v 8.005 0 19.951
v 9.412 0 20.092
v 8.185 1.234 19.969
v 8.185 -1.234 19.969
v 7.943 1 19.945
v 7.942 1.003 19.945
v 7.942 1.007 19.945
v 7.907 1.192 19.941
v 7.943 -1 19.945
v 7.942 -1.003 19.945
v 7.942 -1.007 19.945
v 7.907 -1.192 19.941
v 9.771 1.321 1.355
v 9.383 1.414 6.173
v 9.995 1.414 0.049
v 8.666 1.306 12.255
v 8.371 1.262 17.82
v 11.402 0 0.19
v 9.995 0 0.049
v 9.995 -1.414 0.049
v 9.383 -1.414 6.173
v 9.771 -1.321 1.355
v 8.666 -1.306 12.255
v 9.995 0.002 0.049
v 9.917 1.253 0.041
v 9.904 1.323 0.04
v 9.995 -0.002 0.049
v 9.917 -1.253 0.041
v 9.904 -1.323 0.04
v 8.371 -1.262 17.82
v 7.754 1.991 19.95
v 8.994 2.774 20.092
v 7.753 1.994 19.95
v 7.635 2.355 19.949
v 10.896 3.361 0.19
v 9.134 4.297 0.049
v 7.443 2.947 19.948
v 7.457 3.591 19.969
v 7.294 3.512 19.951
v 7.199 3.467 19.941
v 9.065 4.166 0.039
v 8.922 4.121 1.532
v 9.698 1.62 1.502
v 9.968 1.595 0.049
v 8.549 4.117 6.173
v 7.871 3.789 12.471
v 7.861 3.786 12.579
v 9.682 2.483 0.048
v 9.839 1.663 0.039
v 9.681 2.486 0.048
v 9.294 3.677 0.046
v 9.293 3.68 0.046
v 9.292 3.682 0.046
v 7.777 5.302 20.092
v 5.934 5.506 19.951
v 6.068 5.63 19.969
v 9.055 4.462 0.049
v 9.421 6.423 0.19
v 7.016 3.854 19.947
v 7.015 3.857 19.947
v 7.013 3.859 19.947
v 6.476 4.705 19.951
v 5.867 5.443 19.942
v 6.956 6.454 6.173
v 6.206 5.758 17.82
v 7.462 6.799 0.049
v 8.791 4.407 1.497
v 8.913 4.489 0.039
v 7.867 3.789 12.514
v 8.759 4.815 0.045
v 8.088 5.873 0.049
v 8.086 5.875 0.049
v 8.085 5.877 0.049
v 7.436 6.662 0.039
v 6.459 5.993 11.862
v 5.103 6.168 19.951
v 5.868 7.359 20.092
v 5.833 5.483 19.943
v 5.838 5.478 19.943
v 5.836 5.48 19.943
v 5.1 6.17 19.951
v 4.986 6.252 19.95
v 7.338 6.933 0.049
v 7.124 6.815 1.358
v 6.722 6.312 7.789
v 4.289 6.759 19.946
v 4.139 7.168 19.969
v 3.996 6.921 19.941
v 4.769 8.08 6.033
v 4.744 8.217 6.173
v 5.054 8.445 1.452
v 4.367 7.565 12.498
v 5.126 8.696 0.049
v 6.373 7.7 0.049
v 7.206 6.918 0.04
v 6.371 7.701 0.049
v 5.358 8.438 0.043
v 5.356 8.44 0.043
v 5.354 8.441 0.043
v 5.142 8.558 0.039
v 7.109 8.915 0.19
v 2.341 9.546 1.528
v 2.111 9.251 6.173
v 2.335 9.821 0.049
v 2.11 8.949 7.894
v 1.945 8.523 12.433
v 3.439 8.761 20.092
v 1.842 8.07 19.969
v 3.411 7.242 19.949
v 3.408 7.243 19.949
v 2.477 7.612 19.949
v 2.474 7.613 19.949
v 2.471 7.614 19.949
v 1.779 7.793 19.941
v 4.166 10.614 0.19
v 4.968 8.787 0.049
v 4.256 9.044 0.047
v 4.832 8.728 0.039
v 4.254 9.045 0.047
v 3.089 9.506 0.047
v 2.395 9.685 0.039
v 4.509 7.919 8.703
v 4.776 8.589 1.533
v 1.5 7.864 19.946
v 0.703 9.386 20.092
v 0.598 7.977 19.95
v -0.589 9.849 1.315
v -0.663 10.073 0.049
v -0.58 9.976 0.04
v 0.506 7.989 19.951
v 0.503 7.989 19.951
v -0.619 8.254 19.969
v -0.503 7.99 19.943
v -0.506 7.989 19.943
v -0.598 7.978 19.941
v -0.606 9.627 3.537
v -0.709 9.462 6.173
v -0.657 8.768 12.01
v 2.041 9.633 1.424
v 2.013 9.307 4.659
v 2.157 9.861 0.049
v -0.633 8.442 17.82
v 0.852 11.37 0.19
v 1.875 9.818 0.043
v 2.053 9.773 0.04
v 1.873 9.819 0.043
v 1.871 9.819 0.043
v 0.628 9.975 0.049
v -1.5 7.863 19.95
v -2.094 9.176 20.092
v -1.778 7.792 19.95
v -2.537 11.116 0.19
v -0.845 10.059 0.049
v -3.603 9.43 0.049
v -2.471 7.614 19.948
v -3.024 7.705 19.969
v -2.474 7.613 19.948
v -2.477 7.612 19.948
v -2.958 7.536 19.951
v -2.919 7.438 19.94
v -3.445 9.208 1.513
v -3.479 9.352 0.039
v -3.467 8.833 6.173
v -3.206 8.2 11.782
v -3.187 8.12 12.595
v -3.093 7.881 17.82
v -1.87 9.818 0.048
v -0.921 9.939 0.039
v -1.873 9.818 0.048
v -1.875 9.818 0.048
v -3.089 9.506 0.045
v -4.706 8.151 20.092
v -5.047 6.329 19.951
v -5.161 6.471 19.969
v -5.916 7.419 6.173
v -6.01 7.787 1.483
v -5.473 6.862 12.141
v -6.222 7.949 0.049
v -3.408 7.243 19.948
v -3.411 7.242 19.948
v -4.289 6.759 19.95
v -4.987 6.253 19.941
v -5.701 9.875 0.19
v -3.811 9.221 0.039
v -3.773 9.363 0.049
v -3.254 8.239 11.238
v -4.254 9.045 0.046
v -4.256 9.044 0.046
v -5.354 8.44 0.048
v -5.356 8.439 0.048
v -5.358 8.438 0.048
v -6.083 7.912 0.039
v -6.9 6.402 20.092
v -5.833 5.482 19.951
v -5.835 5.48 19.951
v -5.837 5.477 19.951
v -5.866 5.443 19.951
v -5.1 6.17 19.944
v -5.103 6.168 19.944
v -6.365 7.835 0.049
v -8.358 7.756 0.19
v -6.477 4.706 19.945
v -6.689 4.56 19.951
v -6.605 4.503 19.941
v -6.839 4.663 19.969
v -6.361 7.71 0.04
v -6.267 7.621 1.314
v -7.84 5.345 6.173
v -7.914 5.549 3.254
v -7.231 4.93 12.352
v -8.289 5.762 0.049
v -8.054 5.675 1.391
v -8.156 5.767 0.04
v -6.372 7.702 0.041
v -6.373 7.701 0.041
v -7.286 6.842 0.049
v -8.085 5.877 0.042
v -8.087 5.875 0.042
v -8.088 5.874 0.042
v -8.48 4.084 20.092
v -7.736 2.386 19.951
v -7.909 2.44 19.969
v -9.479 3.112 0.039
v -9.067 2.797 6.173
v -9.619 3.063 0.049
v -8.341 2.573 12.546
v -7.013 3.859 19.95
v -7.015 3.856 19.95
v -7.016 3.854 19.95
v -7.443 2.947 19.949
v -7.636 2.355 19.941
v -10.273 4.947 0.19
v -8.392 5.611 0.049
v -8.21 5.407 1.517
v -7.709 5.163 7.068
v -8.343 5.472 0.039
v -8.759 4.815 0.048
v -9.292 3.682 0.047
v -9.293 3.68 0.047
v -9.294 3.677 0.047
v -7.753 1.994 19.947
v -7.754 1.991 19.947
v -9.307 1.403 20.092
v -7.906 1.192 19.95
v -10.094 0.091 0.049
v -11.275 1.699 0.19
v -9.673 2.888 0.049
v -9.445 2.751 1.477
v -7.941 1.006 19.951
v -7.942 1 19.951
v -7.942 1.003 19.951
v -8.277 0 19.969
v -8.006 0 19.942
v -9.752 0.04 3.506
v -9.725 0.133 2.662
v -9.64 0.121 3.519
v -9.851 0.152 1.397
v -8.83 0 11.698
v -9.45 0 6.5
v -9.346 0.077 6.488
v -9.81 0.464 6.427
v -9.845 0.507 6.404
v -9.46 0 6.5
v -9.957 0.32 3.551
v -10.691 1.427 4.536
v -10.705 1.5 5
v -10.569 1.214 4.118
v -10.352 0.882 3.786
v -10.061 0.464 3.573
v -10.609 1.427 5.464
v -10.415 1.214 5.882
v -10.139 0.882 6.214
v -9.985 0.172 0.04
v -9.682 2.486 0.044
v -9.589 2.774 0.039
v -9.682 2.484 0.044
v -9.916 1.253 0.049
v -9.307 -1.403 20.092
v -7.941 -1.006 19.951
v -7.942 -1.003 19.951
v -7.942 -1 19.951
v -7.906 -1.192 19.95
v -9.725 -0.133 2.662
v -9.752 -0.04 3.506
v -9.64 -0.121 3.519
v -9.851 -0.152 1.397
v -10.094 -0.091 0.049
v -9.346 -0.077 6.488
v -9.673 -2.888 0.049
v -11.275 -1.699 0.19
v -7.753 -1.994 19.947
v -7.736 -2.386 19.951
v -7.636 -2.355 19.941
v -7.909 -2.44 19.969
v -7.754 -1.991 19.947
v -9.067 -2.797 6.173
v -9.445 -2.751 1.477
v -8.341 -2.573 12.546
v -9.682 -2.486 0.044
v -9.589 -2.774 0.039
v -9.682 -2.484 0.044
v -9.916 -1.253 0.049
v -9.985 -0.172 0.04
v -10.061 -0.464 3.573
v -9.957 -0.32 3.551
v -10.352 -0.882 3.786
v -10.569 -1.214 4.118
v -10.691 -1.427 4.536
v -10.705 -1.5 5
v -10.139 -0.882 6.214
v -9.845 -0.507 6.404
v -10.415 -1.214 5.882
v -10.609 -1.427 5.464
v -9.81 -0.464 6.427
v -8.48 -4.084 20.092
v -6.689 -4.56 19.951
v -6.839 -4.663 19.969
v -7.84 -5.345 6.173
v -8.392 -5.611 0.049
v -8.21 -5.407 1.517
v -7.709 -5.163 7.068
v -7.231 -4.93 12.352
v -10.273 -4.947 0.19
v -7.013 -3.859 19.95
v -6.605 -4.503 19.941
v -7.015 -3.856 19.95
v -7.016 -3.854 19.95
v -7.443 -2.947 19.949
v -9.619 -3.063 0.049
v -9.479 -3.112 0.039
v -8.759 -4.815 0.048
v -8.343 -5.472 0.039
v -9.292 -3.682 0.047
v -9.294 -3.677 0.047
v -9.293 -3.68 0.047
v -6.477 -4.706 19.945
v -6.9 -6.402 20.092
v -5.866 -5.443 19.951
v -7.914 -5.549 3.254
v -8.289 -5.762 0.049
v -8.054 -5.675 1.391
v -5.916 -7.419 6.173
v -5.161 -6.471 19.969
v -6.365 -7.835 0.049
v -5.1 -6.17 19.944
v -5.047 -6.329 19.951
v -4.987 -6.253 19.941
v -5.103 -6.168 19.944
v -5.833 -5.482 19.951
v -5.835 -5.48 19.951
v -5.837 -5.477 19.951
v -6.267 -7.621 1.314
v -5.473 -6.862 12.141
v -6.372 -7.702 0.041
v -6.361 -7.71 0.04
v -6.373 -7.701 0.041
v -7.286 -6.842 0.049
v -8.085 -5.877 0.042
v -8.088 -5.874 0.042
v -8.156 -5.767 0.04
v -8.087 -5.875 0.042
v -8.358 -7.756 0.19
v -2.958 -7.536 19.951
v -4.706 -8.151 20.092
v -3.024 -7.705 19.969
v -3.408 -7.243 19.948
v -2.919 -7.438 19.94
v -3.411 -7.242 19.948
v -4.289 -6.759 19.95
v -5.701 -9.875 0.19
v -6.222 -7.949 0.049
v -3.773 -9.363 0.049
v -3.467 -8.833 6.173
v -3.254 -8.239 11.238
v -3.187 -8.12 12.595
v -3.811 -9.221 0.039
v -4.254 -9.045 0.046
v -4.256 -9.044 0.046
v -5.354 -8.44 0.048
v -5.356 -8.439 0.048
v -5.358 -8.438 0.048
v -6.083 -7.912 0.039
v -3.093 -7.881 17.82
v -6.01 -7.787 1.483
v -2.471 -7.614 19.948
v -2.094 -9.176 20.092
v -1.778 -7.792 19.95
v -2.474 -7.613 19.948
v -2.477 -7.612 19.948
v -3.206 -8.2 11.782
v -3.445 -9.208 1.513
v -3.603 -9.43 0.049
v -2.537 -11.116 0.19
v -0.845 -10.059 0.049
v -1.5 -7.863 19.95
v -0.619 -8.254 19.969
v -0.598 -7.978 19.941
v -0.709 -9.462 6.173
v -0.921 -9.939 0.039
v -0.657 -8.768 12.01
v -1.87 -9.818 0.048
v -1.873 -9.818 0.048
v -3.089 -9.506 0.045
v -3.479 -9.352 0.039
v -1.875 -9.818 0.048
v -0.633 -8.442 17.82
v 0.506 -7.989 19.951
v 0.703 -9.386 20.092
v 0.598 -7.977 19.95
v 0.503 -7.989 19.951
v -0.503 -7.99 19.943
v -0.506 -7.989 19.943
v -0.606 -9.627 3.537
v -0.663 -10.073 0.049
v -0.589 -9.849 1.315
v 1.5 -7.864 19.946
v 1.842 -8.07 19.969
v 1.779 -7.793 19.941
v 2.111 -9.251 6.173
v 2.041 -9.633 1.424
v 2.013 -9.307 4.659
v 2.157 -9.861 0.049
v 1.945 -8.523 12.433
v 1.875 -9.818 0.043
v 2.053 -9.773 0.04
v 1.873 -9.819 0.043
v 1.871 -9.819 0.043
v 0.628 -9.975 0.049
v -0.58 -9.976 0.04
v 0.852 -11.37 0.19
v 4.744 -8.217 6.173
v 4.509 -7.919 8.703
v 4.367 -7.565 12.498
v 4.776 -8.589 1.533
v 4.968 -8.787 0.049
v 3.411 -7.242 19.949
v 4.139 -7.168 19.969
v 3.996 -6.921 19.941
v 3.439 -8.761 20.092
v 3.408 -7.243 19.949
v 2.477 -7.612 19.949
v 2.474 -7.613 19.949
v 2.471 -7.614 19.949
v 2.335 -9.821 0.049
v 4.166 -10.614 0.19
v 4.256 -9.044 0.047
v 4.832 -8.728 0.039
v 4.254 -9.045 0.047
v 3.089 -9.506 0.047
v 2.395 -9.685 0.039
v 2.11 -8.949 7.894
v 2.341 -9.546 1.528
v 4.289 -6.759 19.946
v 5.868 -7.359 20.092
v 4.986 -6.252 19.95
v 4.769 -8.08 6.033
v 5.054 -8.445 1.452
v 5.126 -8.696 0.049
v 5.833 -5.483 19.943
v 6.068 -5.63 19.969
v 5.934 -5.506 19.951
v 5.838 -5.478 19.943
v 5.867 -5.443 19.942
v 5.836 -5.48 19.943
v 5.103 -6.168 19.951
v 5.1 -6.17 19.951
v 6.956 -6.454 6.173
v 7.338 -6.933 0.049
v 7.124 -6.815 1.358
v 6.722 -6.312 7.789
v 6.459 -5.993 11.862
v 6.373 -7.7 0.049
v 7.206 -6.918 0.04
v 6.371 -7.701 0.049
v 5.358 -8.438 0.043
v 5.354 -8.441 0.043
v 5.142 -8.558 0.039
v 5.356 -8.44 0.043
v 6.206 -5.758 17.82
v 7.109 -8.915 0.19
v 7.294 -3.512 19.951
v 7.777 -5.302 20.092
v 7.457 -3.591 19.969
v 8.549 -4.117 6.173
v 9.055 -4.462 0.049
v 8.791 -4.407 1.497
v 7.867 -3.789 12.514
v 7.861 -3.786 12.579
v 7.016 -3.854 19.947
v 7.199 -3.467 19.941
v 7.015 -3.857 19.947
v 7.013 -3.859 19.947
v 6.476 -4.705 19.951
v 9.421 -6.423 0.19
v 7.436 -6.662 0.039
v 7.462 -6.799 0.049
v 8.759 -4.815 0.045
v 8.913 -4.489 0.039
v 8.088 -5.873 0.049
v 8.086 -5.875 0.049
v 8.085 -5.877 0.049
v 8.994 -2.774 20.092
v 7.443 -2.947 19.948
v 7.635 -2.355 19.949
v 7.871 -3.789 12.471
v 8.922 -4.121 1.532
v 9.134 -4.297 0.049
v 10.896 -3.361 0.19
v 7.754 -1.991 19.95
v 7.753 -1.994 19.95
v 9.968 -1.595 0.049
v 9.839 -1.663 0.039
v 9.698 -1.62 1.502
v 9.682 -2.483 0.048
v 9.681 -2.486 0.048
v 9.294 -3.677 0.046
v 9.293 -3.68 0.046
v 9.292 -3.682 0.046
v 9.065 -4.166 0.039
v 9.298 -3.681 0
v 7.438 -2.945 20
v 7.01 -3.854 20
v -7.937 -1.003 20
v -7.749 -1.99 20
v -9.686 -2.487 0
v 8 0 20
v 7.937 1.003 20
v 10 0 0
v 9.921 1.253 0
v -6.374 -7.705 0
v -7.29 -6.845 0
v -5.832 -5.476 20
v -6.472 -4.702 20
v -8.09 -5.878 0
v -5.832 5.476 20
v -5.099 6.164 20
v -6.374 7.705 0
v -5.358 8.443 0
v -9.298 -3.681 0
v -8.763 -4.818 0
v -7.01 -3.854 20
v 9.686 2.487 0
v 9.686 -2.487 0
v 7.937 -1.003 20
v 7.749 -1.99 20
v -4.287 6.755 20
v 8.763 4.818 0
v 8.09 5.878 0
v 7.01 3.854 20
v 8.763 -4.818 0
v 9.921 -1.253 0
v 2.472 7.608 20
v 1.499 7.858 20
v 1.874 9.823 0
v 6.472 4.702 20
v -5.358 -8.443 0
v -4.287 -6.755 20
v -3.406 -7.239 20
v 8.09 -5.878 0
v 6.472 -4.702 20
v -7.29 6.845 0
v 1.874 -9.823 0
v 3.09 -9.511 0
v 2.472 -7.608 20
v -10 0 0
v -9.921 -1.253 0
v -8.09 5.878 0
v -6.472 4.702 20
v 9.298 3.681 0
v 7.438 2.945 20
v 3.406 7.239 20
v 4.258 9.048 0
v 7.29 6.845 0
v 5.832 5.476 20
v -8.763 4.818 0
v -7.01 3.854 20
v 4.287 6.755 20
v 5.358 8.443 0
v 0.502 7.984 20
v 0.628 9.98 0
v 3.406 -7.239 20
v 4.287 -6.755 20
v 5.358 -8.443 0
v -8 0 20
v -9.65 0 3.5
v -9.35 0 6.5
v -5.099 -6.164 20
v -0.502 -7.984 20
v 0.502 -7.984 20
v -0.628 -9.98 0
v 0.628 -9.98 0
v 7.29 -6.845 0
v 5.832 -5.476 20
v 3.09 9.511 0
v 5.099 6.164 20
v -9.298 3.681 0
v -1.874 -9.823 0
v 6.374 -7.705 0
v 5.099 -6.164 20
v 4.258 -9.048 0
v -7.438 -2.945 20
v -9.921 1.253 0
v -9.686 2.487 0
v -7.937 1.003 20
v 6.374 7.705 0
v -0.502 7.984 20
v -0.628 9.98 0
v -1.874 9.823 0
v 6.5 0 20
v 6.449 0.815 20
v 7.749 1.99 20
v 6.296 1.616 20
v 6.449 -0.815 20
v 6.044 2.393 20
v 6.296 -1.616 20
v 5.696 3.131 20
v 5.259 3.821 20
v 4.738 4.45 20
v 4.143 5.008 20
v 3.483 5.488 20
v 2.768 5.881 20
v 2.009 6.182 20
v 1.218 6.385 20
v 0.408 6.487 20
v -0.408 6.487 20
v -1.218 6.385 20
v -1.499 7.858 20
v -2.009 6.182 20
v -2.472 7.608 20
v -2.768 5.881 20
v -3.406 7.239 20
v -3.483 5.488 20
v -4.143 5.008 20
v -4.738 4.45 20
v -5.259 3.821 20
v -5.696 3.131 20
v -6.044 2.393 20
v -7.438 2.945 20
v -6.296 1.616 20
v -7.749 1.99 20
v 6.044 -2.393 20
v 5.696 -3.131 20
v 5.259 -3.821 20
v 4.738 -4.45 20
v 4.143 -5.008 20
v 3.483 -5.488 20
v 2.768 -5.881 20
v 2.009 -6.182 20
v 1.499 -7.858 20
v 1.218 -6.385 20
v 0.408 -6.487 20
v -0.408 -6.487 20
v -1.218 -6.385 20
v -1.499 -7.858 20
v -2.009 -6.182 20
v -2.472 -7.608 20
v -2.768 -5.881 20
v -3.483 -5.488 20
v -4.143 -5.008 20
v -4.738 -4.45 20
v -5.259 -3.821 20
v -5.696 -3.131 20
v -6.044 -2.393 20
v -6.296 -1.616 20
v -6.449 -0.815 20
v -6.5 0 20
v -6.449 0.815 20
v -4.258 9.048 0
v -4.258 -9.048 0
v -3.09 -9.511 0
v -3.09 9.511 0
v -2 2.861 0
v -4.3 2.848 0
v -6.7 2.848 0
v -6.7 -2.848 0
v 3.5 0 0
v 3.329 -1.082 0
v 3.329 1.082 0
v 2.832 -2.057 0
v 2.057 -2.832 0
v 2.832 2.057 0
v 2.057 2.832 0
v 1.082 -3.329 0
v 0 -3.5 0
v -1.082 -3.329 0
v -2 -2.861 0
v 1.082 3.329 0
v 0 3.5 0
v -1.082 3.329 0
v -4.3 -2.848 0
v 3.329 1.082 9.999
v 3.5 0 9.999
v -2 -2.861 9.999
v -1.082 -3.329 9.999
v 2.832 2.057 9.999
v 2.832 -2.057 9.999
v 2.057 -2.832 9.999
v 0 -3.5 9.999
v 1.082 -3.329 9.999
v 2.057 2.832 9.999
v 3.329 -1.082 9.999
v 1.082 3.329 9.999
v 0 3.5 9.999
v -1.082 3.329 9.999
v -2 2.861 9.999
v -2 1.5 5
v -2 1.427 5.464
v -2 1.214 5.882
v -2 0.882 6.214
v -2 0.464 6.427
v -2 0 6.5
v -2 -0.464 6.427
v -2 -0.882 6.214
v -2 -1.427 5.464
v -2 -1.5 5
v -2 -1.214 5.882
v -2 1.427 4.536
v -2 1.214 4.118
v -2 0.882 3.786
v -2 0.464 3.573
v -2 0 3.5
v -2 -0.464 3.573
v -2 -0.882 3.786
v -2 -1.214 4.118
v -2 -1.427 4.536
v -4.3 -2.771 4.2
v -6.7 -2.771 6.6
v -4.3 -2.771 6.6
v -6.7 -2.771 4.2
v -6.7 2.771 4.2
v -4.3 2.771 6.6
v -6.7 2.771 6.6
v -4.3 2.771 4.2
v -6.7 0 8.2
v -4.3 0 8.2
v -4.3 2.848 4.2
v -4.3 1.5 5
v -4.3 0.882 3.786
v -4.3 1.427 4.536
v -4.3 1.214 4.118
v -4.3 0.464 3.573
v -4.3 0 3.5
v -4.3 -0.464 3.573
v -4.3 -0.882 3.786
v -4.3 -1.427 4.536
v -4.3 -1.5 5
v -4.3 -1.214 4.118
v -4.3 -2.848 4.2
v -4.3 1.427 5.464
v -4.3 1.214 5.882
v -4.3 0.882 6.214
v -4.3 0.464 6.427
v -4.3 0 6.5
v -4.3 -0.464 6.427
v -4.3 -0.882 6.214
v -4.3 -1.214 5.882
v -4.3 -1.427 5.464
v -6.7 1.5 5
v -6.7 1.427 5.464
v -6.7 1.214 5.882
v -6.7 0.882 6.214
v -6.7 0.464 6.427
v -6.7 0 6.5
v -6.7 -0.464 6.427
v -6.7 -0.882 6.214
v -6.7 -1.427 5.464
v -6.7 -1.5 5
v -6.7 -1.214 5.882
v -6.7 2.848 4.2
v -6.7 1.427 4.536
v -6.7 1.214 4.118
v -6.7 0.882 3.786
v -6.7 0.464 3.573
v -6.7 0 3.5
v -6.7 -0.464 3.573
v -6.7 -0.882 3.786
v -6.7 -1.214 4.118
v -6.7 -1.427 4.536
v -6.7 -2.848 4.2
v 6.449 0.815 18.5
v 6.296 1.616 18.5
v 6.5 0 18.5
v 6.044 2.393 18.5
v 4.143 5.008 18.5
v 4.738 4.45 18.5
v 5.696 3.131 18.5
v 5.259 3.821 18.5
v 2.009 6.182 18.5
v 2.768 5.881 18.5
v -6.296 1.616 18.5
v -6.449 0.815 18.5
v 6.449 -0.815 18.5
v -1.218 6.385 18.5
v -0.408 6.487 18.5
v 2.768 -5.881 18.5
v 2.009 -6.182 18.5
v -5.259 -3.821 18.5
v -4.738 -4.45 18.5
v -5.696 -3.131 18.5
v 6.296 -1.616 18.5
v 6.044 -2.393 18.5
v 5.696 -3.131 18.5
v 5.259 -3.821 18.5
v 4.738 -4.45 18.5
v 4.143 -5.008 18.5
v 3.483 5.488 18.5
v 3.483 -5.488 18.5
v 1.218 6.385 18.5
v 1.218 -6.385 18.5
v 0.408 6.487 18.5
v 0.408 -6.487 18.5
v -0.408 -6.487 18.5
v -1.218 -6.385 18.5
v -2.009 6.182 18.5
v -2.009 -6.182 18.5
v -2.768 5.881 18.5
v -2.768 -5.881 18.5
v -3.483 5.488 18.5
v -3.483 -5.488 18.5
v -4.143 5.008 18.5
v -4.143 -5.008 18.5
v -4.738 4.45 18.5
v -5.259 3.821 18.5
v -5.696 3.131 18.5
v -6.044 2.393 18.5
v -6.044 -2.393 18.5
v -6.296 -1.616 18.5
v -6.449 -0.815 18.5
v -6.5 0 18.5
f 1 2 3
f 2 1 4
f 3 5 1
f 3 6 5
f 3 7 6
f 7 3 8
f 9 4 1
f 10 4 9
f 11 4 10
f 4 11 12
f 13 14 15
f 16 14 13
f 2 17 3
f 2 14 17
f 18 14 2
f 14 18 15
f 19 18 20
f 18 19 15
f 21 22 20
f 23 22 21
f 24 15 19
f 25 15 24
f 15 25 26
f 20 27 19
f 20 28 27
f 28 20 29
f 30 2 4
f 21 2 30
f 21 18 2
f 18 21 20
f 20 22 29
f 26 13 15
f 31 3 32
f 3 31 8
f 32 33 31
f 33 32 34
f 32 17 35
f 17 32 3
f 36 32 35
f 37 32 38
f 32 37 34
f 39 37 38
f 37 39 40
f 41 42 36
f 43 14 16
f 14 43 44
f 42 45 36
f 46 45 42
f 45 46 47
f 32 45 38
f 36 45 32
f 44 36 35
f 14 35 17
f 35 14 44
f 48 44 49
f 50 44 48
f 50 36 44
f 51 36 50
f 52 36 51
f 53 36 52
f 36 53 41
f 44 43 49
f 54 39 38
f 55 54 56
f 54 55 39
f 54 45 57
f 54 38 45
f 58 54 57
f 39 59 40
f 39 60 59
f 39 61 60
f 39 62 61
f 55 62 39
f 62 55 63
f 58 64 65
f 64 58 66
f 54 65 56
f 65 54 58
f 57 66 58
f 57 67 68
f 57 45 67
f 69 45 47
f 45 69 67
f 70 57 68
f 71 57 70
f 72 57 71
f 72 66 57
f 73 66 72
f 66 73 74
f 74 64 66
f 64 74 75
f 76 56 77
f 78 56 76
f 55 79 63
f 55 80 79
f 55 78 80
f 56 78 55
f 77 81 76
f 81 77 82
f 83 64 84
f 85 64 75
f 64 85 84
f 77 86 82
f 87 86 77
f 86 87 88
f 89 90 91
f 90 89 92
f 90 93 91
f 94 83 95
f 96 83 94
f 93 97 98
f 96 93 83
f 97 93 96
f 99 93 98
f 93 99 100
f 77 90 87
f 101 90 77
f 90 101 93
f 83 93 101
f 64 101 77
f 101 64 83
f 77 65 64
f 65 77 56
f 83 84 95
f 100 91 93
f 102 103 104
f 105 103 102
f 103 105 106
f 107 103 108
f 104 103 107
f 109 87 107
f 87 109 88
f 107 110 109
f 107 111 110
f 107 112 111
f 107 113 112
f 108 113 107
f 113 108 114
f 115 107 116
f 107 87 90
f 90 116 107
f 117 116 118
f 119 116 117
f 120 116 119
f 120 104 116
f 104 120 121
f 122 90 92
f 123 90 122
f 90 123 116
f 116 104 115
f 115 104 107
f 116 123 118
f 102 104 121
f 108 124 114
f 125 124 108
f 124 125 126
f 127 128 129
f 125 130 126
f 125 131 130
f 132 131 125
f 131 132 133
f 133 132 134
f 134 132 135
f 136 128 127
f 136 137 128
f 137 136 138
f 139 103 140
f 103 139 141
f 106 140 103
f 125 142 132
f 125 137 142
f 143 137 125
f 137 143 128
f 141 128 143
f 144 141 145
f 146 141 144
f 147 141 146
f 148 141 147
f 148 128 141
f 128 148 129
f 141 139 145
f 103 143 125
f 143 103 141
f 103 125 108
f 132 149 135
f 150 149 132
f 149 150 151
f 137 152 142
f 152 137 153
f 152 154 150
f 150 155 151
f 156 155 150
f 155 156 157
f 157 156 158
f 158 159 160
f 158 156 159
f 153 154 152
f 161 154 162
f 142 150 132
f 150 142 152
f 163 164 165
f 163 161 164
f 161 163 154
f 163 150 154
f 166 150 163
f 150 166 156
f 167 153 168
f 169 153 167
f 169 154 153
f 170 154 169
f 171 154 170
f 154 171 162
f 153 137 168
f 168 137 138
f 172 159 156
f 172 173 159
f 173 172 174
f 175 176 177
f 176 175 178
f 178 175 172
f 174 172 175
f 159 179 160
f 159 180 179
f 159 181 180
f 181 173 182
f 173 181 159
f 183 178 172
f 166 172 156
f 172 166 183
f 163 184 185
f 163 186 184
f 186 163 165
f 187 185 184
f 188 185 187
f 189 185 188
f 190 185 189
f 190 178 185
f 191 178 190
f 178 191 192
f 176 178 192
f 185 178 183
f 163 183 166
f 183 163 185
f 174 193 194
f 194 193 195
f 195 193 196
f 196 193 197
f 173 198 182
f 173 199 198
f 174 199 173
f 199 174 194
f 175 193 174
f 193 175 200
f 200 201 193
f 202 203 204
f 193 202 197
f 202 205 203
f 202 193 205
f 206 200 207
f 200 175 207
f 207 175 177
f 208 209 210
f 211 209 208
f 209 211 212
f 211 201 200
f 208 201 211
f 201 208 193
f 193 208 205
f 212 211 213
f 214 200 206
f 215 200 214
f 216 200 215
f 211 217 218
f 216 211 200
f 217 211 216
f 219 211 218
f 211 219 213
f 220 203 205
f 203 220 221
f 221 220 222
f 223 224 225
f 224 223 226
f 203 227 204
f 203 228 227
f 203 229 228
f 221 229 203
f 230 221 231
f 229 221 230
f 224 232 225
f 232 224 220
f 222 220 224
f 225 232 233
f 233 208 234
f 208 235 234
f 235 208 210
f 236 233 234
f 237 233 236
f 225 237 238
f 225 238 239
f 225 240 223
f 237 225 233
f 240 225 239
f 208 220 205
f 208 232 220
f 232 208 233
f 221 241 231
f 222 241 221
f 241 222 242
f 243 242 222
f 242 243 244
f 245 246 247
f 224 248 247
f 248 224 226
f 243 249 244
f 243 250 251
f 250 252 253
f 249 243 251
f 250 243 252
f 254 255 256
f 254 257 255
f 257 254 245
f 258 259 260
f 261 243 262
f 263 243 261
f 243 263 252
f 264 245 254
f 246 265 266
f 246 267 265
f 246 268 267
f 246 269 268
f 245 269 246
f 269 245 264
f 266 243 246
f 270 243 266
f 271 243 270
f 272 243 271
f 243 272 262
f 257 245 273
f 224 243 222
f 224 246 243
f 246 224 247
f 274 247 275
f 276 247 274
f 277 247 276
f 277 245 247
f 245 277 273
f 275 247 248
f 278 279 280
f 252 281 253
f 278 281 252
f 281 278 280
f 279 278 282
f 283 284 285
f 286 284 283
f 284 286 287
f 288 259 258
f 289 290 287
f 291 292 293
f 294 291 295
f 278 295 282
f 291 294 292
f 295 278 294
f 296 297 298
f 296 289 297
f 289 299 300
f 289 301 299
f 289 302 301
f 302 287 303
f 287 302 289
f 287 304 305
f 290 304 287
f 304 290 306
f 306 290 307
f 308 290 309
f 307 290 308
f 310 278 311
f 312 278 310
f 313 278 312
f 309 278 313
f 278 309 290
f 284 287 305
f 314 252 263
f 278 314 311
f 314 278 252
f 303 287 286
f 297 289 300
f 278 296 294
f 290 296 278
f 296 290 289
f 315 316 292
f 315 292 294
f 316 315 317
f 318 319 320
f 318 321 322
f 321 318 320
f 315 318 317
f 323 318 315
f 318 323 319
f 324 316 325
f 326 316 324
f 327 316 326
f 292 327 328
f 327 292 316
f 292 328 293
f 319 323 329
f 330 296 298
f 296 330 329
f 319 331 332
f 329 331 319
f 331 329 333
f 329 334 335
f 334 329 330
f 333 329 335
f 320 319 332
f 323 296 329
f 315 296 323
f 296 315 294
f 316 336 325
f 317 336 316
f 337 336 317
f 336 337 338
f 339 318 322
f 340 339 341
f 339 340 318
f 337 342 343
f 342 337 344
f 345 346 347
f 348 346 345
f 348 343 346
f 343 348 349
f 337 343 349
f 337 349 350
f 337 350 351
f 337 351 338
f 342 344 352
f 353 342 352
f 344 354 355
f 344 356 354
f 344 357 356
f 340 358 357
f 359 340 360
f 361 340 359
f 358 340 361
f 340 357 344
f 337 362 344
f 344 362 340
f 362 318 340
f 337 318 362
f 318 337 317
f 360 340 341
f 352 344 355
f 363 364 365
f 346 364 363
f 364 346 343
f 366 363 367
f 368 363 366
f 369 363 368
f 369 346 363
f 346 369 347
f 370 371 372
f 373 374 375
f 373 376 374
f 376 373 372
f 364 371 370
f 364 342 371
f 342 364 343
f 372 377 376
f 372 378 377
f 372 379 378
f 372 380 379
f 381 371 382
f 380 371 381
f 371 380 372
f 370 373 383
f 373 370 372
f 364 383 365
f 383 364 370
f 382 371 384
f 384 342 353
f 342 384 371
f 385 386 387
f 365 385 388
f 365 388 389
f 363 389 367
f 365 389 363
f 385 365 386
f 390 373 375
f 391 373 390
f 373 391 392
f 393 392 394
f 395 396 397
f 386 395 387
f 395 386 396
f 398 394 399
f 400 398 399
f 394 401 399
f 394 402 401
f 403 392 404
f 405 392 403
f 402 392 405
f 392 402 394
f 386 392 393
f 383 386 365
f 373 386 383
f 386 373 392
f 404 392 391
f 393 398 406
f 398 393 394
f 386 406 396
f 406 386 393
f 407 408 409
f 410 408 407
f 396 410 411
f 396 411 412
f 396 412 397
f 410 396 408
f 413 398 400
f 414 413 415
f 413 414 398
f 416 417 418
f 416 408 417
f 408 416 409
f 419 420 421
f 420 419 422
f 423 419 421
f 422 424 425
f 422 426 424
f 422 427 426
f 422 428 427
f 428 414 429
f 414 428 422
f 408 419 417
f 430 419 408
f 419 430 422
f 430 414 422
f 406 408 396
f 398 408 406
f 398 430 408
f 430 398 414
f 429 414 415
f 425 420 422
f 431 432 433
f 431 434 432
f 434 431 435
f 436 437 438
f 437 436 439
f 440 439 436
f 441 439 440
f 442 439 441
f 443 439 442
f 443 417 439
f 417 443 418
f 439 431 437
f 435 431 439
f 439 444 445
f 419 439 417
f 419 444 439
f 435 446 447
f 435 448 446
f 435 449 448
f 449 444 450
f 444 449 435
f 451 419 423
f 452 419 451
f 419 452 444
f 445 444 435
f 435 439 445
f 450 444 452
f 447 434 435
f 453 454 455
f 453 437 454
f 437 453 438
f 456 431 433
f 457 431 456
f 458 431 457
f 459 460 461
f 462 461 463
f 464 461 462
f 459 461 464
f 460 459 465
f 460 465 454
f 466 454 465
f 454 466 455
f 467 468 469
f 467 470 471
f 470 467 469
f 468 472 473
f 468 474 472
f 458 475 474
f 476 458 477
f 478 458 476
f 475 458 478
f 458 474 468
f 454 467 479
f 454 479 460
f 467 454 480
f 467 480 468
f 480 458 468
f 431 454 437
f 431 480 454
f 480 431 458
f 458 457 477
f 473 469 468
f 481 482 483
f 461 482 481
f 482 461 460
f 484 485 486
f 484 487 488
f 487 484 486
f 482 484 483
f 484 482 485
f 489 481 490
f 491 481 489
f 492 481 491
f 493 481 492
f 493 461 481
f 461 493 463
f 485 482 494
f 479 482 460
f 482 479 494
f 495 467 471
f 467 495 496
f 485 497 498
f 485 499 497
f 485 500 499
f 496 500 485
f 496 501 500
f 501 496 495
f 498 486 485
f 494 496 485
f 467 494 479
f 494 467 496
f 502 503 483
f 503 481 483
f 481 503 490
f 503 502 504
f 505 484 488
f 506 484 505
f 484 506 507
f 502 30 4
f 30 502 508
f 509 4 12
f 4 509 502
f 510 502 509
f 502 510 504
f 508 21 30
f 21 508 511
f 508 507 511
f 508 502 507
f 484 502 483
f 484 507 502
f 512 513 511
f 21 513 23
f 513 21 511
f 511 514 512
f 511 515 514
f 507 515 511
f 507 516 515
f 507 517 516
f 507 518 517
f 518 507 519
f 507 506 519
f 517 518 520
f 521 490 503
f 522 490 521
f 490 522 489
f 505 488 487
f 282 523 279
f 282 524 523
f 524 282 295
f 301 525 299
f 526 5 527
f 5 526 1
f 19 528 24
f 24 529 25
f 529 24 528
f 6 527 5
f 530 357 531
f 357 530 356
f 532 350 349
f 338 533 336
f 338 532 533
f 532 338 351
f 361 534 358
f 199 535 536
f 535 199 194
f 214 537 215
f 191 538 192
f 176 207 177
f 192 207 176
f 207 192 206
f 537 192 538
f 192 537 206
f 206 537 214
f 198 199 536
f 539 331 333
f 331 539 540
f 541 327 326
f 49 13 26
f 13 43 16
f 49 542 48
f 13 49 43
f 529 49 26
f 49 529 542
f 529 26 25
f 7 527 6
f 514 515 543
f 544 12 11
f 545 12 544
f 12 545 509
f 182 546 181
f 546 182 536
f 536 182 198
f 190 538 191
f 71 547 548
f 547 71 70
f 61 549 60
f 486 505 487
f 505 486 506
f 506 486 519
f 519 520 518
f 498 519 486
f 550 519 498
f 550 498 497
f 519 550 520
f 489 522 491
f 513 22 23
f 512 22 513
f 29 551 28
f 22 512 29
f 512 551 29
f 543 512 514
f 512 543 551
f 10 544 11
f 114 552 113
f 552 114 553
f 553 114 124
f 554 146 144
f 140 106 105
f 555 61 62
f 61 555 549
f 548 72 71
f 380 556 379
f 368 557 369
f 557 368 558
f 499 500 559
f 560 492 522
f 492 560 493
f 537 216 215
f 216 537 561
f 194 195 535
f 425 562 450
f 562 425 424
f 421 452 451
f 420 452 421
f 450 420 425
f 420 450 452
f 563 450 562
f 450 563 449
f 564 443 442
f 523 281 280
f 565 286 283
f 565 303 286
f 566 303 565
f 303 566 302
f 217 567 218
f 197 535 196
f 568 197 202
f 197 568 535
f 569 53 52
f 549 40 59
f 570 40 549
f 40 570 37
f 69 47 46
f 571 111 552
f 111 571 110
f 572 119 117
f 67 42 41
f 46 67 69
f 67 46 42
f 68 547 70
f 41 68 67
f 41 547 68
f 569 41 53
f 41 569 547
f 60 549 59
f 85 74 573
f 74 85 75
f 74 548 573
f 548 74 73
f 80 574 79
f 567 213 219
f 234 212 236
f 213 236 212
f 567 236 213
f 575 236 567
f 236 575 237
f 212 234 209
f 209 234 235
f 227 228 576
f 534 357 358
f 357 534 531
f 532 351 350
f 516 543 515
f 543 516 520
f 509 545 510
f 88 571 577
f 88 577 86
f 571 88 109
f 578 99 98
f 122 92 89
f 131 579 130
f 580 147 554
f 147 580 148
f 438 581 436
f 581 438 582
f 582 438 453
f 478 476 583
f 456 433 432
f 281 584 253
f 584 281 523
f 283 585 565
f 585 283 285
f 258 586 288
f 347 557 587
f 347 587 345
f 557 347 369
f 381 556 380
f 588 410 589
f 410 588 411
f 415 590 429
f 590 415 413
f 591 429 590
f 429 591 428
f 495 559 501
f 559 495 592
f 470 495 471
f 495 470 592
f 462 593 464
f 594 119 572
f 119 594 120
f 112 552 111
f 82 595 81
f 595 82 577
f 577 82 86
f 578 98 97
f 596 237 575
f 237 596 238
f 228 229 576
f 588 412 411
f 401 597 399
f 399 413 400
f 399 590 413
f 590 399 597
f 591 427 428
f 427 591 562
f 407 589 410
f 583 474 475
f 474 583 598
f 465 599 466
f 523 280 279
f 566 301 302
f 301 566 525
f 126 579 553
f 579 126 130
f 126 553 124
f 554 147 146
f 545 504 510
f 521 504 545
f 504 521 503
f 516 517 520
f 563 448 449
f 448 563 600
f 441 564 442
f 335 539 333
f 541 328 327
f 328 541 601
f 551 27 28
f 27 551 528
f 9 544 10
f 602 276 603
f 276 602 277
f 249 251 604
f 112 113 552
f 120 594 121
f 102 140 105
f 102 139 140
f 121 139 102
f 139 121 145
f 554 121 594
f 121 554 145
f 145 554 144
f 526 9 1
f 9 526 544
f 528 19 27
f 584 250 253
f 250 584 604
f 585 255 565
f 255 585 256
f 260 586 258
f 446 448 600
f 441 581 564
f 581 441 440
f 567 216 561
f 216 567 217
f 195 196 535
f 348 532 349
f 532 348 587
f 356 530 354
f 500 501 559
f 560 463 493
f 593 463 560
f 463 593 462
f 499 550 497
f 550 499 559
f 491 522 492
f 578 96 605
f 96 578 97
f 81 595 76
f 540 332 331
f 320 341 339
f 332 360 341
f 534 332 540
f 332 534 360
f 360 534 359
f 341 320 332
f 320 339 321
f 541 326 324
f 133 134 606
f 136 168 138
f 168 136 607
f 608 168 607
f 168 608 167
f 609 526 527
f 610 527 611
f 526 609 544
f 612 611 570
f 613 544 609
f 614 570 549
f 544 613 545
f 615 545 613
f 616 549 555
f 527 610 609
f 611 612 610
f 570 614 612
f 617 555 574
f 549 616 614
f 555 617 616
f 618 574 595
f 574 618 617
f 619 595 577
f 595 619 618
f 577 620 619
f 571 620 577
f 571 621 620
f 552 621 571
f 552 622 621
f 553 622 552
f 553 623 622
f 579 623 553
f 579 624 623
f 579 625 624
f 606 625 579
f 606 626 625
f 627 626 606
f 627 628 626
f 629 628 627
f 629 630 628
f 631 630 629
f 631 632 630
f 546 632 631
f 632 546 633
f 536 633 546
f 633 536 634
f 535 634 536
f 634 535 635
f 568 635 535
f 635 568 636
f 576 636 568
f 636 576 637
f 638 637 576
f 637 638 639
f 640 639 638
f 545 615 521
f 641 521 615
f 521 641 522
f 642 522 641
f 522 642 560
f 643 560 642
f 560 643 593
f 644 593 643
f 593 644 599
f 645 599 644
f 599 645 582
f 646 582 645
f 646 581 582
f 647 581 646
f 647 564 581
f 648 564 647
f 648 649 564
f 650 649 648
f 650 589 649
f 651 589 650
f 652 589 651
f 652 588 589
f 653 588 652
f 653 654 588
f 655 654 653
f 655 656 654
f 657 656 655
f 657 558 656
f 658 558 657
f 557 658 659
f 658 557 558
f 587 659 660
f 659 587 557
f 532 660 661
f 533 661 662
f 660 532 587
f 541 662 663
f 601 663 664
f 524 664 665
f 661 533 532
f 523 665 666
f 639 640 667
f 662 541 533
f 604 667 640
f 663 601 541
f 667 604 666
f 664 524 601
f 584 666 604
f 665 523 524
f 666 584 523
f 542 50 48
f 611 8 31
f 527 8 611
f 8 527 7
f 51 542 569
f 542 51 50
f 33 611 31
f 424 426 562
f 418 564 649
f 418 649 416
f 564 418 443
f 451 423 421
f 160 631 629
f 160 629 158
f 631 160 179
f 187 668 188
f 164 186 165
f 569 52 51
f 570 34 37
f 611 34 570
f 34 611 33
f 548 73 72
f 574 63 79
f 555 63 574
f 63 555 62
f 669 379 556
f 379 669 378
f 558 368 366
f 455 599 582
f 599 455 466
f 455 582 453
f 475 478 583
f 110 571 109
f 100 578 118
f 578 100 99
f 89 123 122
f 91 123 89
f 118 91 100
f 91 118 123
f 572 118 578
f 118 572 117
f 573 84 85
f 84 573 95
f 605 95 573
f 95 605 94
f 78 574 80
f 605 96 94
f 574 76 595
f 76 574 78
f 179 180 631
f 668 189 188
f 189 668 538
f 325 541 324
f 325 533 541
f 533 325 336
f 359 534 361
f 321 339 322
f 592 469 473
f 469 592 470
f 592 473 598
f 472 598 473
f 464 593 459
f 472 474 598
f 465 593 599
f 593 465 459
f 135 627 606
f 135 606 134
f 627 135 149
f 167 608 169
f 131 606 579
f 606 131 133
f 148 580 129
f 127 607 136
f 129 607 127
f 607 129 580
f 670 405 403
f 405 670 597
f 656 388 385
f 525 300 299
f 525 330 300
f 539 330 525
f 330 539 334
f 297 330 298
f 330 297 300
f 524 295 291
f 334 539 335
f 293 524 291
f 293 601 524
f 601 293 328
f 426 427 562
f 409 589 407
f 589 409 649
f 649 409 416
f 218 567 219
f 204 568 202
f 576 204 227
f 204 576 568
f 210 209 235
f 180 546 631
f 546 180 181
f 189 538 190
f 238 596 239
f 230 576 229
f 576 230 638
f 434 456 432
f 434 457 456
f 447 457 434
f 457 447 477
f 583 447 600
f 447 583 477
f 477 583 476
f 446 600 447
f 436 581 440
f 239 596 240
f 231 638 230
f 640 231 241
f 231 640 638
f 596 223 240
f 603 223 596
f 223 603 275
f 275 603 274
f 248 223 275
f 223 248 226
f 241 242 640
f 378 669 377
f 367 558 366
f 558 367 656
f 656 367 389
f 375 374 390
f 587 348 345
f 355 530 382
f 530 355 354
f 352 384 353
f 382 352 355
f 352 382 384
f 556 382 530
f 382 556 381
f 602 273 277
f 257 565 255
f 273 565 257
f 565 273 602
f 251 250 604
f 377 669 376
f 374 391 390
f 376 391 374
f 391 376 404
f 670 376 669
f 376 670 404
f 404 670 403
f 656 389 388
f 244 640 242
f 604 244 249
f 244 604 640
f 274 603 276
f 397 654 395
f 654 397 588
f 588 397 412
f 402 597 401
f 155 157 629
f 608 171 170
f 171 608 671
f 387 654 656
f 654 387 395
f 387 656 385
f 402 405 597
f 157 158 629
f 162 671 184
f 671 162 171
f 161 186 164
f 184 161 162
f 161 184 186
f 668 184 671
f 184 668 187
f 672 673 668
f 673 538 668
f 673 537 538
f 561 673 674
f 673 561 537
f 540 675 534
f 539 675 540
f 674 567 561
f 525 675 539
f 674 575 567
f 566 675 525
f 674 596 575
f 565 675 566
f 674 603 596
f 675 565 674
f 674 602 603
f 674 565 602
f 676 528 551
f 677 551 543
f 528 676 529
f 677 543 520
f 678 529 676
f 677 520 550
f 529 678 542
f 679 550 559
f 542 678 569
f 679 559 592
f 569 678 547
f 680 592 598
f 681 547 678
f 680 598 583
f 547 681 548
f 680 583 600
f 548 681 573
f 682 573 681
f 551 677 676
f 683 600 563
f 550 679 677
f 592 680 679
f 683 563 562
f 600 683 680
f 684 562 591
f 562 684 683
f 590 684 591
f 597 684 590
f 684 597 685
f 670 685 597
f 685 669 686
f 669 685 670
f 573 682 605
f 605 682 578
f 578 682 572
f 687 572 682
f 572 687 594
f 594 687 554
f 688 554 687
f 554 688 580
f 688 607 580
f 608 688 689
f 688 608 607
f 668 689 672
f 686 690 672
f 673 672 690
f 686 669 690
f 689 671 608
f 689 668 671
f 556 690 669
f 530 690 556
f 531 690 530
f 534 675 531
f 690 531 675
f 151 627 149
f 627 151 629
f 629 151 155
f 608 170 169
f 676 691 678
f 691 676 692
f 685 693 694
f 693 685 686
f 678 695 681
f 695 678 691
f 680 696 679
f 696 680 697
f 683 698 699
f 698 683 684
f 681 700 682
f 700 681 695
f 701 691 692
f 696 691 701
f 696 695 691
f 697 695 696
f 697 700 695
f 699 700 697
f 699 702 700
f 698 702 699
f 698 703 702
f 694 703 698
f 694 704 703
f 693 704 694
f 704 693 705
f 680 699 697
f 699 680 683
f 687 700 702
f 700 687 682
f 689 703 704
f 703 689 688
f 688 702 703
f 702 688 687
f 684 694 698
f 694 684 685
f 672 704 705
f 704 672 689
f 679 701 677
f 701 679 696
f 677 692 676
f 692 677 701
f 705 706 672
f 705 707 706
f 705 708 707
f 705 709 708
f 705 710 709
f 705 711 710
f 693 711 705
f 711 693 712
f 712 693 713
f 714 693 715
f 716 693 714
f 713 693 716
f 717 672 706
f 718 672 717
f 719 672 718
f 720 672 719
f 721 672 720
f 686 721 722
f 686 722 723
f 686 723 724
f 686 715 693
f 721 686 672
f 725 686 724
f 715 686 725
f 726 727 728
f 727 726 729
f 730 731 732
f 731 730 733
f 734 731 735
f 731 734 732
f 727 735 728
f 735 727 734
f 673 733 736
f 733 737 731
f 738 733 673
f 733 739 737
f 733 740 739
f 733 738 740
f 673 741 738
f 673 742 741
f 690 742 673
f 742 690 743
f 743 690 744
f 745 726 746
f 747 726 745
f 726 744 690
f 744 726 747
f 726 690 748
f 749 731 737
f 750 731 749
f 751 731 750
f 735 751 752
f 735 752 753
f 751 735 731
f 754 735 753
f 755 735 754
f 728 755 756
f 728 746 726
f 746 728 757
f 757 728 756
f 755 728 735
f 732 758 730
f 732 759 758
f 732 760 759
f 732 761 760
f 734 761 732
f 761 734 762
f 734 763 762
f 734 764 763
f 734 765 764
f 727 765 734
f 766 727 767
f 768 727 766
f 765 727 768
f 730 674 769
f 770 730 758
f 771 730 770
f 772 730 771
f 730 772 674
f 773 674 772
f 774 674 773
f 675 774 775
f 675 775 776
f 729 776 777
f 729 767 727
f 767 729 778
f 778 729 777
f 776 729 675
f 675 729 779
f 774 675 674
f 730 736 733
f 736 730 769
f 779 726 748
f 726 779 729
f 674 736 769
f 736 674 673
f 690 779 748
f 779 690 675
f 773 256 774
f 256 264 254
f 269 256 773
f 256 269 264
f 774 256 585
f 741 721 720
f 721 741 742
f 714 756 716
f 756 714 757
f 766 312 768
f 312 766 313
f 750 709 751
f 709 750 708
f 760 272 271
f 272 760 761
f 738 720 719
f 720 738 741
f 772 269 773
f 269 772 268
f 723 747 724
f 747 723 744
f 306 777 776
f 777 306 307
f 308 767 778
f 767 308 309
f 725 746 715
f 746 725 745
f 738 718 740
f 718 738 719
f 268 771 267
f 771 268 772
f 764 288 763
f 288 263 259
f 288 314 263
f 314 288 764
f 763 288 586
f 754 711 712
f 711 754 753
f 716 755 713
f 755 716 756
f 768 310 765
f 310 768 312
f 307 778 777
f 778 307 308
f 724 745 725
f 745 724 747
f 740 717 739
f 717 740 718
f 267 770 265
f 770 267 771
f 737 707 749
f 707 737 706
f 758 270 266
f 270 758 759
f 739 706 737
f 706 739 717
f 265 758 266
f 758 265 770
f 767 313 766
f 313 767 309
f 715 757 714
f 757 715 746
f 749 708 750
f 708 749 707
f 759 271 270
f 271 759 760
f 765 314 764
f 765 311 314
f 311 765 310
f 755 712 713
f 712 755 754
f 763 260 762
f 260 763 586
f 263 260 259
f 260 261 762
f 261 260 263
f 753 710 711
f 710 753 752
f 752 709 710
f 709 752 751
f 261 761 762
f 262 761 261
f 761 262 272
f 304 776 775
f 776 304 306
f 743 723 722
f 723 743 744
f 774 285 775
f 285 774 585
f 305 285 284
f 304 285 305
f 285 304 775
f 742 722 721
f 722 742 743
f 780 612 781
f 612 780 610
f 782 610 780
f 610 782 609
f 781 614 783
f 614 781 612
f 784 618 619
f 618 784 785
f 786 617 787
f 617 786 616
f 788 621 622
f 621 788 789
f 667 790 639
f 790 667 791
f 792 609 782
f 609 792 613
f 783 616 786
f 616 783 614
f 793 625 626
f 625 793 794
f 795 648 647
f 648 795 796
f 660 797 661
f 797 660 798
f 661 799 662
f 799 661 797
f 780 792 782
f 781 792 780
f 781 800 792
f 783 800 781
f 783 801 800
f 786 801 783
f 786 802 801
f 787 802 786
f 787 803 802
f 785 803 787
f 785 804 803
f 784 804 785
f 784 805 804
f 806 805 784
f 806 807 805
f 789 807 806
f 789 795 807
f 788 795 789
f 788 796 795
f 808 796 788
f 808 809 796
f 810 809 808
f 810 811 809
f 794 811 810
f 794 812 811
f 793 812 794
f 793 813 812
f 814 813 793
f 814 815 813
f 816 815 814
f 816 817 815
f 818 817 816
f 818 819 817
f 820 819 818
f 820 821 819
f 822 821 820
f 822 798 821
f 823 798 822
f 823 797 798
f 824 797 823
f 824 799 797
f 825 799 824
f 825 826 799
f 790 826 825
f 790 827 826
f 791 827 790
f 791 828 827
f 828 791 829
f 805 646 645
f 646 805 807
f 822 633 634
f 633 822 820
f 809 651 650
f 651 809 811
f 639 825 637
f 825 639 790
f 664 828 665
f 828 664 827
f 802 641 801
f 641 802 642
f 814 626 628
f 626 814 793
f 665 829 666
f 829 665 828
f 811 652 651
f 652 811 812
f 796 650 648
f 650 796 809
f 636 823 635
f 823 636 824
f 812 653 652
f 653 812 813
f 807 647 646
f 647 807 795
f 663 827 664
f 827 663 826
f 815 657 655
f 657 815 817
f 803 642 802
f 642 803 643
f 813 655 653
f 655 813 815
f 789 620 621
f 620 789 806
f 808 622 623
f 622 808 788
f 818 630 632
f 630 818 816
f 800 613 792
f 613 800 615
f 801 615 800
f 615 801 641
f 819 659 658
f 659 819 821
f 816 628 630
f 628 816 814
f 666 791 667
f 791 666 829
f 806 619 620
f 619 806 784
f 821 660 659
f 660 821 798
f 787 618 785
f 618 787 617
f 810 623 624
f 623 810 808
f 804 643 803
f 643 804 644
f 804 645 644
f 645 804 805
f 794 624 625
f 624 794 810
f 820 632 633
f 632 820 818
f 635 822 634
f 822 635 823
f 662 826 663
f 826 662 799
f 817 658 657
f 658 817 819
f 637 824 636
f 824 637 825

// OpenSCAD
// https://www.thingiverse.com/thing:54024
//////////////////////////
// Customizable settings
//////////////////////////

m = 0.5;

// Diameter of the hole on the bottom (in mm).
HoleDiameter = 7;

// Depth of the hole in the bottom (in mm).  If you want the hole to go all the way through then set this to a number larger than the total height of the object.
HoleDepth = 10;

// If you want a D-shaped hole, set this to the thickness of the flat side (in mm).  Larger values for the flat make the hole smaller.
HoleFlatThickness = 1.5;

// Height (in mm).  If dome cap is selected, it is not included in height.  The shaft length is also not counted.
KnobHeight = 20;

// Diameter of base of round part of knob (in mm).  (Knurled ridges are not included in this measurement.)
KnobDiameter = 20;

// Shape of top of knob.  "Recessed" type can be painted.
CapType = 1;	// [0:Flat, 1:Recessed, 2:Dome]

// Do you want a large timer-knob style pointer?
TimerKnob=0;	// [0:No, 1:Yes]

// Would you like a divot on the top to indicate direction?
Pointer1 = 0;	// [0:No, 1:Yes]

// Would you like a line (pointer) on the front to indicate direction?
Pointer2 = 0;	// [0:No, 1:Yes]

// Do you want finger ridges around the knob?
Knurled = 1;	// [0:No, 1:Yes]

// 0 = A cylindrical knob, any other value will taper the knob.
TaperPercentage = 20;		// [0:0%, 10:10%, 20:20%, 30:30%, 40:40%, 50:50%]

// Width of "dial" ring (in mm).  Set to zero if you don't want the ring.
RingWidth = 0;

// The number of markings on the dial.  Set to zero if you don't want markings.  (RingWidth must be non-zero.)
RingMarkings = 10;

// diameter of the hole for the setscrew (in mm).  If you don't need a hole, set this to zero.
ScrewHoleDiameter = 3;

NutDiameter = 6.4;
NutHeight = 2.4;

// Length of the shaft on the bottom of the knob (in mm).  If you don't want a shaft, set this value to zero.
ShaftLength = 0;

// Diameter of the shaft on the bottom of the knob (in mm).  (ShaftLength must be non-zero.)
ShaftDiameter = 10;

// Would you like a notch in the shaft?  It can be used for a press-on type knob (rather than using a setscrew).  (ShaftLength must be non-zero.)
NotchedShaft = 1;	// [0:No, 1:Yes]



//////////////////////////
//Advanced settings
//////////////////////////

RingThickness = 5*1;
DivotDepth = 1.5*1;
MarkingWidth = 1.5*1;
DistanceBetweenKnurls = 3*1;
TimerKnobConst = 1.8*1;



//////////////////////////
//Calculations
//////////////////////////

PI=3.14159265*1;
KnobMajorRadius = KnobDiameter/2;
KnobMinorRadius = KnobDiameter/2 * (1 - TaperPercentage/100);
KnobRadius = KnobMinorRadius + (KnobMajorRadius-KnobMinorRadius)/2;
KnobCircumference = PI*KnobDiameter;
Knurls = round(KnobCircumference/DistanceBetweenKnurls);
Divot=CapType;

TaperAngle=asin(KnobHeight / (sqrt(pow(KnobHeight, 2) +
		pow(KnobMajorRadius-KnobMinorRadius,2)))) - 90;

DivotRadius = KnobMinorRadius*.4;


module knob(){
    union()
    {
    translate([0, 0, (ShaftLength==0)? 0 : ShaftLength-0.001])
    difference()
    {
    union()
    {
        // Primary knob cylinder
        cylinder(h=KnobHeight, r1=KnobMajorRadius, r2=KnobMinorRadius,
                $fn=50);
        
        if (Knurled)
            for (i=[0 : Knurls-1])
                rotate([0, 0, i * (360/Knurls)])
                    translate([KnobRadius, 0, KnobHeight/2])
                        rotate([0, TaperAngle, 0]) rotate([0, 0, 45])
                            cube([2, 2, KnobHeight+.001], center=true);

        if (RingMarkings>0)
            for (i=[0 : RingMarkings-1])
                rotate([0, 0, i * (360/RingMarkings)])
                    translate([KnobMajorRadius + RingWidth/2, 0, 1])
                        cube([RingWidth*.5, MarkingWidth, 2], center=true);		
        
        if (Pointer2==1)
            translate([KnobRadius, 0, KnobHeight/2-2])
                rotate([0, TaperAngle, 0])
                    cube([8, 3, KnobHeight], center=true);		

        if (RingWidth>0)
            translate([0, 0, RingThickness/2])
                cylinder(r1=KnobMajorRadius + RingWidth, r2=KnobMinorRadius,
                        h=RingThickness, $fn=50, center=true);

        if (Divot==2)
            translate([0, 0, KnobHeight])
                difference()
                {
                    scale([1, 1, 0.5])
                        sphere(r=KnobMinorRadius, $fn=50, center=true);

                    translate([0, 0, 0-(KnobMinorRadius+.001)])
                        cube([KnobMinorRadius*2.5, KnobMinorRadius*2.5,
                                KnobMinorRadius*2], center=true);
                }

        if (TimerKnob==1) intersection()
            {
                translate([0, 0, 0-(KnobDiameter*TimerKnobConst) + KnobHeight])
                sphere(r=KnobDiameter*TimerKnobConst, $fn=50, center=true);		
        
                translate([0-(KnobDiameter*TimerKnobConst)*0.1, 0,
                        KnobHeight/2])
                    scale([1, 0.5, 1])
                        cylinder(h=KnobHeight, r=(KnobDiameter*TimerKnobConst) *
                                0.8, $fn=3, center=true);
            }
    }

    // Pointer1: Offset hemispherical divot
    if (Pointer1==1)
        translate([KnobMinorRadius*.55, 0, KnobHeight + DivotRadius*.6])
            sphere(r=DivotRadius, $fn=40);

    // Divot1: Centered cylynrical divot
    if (Divot==1)
        translate([0, 0, KnobHeight])
            cylinder(h=DivotDepth*2, r=KnobMinorRadius-1.5, $fn=50,
                    center=true);

    if (ShaftLength==0)
    {
        // Hole for shaft
        translate([0, 0, HoleDepth/2 - 0.001])
            difference()
            {
                cylinder(r=HoleDiameter/2, h=HoleDepth, $fn=20,
                        center=true);
        
                // Flat for D-shaped hole
                translate([(0-HoleDiameter)+HoleFlatThickness, 0, 0])
                    cube([HoleDiameter, HoleDiameter, HoleDepth+.001],
                            center=true);
            }
        
        // Hole for setscrew
        if (ScrewHoleDiameter>0)
            translate([0 - (KnobMajorRadius+RingWidth+1)/2, 0,
                    HoleDepth/2]){
                    rotate([0, 90, 0]){
                        
                        cylinder(h=(KnobMajorRadius+RingWidth+1),
                                r=ScrewHoleDiameter/2, $fn=20, center=true);
                        union(){
                            cylinder(r= NutDiameter/2, h = NutHeight, $fn=6, center = true);
                            translate([4,0,0]) cube([NutDiameter, NutDiameter * 0.89, NutHeight], center = true);
                        }
                    }
            }
    }

    // Make sure bottom ends at z=0
    translate([0, 0, -10])
        cube([(KnobMajorRadius+RingWidth) * 3,
                (KnobMajorRadius+RingWidth) * 3, 20], center=true);
    }

    if (ShaftLength>0)
        difference()
        {
            translate([0, 0, ShaftLength/2])
                cylinder(h=ShaftLength, r=ShaftDiameter/2, $fn=20,
                        center=true);

            if (NotchedShaft==1)
            {
                cube([HoleDiameter/2, ShaftDiameter*2, ShaftLength],
                        center=true);
            }

            // Hole for shaft
            translate([0, 0, HoleDepth/2 - 0.001])
                difference()
                {
                    cylinder(r=HoleDiameter/2, h=HoleDepth, $fn=20,
                            center=true);
            
                    // Flat for D-shaped hole
                    translate([(0-HoleDiameter)+HoleFlatThickness, 0, 0])
                        cube([HoleDiameter, HoleDiameter, HoleDepth+.001],
                                center=true);
                }
            
            // Hole for setscrew
            if (ScrewHoleDiameter>0)
                translate([0 - (KnobMajorRadius+RingWidth+1)/2, 0,
                        HoleDepth/2])
                    rotate([0, 90, 0])
                    cylinder(h=(KnobMajorRadius+RingWidth+1),
                            r=ScrewHoleDiameter/2, $fn=20, center=true);
        }
    }
}

knob();
